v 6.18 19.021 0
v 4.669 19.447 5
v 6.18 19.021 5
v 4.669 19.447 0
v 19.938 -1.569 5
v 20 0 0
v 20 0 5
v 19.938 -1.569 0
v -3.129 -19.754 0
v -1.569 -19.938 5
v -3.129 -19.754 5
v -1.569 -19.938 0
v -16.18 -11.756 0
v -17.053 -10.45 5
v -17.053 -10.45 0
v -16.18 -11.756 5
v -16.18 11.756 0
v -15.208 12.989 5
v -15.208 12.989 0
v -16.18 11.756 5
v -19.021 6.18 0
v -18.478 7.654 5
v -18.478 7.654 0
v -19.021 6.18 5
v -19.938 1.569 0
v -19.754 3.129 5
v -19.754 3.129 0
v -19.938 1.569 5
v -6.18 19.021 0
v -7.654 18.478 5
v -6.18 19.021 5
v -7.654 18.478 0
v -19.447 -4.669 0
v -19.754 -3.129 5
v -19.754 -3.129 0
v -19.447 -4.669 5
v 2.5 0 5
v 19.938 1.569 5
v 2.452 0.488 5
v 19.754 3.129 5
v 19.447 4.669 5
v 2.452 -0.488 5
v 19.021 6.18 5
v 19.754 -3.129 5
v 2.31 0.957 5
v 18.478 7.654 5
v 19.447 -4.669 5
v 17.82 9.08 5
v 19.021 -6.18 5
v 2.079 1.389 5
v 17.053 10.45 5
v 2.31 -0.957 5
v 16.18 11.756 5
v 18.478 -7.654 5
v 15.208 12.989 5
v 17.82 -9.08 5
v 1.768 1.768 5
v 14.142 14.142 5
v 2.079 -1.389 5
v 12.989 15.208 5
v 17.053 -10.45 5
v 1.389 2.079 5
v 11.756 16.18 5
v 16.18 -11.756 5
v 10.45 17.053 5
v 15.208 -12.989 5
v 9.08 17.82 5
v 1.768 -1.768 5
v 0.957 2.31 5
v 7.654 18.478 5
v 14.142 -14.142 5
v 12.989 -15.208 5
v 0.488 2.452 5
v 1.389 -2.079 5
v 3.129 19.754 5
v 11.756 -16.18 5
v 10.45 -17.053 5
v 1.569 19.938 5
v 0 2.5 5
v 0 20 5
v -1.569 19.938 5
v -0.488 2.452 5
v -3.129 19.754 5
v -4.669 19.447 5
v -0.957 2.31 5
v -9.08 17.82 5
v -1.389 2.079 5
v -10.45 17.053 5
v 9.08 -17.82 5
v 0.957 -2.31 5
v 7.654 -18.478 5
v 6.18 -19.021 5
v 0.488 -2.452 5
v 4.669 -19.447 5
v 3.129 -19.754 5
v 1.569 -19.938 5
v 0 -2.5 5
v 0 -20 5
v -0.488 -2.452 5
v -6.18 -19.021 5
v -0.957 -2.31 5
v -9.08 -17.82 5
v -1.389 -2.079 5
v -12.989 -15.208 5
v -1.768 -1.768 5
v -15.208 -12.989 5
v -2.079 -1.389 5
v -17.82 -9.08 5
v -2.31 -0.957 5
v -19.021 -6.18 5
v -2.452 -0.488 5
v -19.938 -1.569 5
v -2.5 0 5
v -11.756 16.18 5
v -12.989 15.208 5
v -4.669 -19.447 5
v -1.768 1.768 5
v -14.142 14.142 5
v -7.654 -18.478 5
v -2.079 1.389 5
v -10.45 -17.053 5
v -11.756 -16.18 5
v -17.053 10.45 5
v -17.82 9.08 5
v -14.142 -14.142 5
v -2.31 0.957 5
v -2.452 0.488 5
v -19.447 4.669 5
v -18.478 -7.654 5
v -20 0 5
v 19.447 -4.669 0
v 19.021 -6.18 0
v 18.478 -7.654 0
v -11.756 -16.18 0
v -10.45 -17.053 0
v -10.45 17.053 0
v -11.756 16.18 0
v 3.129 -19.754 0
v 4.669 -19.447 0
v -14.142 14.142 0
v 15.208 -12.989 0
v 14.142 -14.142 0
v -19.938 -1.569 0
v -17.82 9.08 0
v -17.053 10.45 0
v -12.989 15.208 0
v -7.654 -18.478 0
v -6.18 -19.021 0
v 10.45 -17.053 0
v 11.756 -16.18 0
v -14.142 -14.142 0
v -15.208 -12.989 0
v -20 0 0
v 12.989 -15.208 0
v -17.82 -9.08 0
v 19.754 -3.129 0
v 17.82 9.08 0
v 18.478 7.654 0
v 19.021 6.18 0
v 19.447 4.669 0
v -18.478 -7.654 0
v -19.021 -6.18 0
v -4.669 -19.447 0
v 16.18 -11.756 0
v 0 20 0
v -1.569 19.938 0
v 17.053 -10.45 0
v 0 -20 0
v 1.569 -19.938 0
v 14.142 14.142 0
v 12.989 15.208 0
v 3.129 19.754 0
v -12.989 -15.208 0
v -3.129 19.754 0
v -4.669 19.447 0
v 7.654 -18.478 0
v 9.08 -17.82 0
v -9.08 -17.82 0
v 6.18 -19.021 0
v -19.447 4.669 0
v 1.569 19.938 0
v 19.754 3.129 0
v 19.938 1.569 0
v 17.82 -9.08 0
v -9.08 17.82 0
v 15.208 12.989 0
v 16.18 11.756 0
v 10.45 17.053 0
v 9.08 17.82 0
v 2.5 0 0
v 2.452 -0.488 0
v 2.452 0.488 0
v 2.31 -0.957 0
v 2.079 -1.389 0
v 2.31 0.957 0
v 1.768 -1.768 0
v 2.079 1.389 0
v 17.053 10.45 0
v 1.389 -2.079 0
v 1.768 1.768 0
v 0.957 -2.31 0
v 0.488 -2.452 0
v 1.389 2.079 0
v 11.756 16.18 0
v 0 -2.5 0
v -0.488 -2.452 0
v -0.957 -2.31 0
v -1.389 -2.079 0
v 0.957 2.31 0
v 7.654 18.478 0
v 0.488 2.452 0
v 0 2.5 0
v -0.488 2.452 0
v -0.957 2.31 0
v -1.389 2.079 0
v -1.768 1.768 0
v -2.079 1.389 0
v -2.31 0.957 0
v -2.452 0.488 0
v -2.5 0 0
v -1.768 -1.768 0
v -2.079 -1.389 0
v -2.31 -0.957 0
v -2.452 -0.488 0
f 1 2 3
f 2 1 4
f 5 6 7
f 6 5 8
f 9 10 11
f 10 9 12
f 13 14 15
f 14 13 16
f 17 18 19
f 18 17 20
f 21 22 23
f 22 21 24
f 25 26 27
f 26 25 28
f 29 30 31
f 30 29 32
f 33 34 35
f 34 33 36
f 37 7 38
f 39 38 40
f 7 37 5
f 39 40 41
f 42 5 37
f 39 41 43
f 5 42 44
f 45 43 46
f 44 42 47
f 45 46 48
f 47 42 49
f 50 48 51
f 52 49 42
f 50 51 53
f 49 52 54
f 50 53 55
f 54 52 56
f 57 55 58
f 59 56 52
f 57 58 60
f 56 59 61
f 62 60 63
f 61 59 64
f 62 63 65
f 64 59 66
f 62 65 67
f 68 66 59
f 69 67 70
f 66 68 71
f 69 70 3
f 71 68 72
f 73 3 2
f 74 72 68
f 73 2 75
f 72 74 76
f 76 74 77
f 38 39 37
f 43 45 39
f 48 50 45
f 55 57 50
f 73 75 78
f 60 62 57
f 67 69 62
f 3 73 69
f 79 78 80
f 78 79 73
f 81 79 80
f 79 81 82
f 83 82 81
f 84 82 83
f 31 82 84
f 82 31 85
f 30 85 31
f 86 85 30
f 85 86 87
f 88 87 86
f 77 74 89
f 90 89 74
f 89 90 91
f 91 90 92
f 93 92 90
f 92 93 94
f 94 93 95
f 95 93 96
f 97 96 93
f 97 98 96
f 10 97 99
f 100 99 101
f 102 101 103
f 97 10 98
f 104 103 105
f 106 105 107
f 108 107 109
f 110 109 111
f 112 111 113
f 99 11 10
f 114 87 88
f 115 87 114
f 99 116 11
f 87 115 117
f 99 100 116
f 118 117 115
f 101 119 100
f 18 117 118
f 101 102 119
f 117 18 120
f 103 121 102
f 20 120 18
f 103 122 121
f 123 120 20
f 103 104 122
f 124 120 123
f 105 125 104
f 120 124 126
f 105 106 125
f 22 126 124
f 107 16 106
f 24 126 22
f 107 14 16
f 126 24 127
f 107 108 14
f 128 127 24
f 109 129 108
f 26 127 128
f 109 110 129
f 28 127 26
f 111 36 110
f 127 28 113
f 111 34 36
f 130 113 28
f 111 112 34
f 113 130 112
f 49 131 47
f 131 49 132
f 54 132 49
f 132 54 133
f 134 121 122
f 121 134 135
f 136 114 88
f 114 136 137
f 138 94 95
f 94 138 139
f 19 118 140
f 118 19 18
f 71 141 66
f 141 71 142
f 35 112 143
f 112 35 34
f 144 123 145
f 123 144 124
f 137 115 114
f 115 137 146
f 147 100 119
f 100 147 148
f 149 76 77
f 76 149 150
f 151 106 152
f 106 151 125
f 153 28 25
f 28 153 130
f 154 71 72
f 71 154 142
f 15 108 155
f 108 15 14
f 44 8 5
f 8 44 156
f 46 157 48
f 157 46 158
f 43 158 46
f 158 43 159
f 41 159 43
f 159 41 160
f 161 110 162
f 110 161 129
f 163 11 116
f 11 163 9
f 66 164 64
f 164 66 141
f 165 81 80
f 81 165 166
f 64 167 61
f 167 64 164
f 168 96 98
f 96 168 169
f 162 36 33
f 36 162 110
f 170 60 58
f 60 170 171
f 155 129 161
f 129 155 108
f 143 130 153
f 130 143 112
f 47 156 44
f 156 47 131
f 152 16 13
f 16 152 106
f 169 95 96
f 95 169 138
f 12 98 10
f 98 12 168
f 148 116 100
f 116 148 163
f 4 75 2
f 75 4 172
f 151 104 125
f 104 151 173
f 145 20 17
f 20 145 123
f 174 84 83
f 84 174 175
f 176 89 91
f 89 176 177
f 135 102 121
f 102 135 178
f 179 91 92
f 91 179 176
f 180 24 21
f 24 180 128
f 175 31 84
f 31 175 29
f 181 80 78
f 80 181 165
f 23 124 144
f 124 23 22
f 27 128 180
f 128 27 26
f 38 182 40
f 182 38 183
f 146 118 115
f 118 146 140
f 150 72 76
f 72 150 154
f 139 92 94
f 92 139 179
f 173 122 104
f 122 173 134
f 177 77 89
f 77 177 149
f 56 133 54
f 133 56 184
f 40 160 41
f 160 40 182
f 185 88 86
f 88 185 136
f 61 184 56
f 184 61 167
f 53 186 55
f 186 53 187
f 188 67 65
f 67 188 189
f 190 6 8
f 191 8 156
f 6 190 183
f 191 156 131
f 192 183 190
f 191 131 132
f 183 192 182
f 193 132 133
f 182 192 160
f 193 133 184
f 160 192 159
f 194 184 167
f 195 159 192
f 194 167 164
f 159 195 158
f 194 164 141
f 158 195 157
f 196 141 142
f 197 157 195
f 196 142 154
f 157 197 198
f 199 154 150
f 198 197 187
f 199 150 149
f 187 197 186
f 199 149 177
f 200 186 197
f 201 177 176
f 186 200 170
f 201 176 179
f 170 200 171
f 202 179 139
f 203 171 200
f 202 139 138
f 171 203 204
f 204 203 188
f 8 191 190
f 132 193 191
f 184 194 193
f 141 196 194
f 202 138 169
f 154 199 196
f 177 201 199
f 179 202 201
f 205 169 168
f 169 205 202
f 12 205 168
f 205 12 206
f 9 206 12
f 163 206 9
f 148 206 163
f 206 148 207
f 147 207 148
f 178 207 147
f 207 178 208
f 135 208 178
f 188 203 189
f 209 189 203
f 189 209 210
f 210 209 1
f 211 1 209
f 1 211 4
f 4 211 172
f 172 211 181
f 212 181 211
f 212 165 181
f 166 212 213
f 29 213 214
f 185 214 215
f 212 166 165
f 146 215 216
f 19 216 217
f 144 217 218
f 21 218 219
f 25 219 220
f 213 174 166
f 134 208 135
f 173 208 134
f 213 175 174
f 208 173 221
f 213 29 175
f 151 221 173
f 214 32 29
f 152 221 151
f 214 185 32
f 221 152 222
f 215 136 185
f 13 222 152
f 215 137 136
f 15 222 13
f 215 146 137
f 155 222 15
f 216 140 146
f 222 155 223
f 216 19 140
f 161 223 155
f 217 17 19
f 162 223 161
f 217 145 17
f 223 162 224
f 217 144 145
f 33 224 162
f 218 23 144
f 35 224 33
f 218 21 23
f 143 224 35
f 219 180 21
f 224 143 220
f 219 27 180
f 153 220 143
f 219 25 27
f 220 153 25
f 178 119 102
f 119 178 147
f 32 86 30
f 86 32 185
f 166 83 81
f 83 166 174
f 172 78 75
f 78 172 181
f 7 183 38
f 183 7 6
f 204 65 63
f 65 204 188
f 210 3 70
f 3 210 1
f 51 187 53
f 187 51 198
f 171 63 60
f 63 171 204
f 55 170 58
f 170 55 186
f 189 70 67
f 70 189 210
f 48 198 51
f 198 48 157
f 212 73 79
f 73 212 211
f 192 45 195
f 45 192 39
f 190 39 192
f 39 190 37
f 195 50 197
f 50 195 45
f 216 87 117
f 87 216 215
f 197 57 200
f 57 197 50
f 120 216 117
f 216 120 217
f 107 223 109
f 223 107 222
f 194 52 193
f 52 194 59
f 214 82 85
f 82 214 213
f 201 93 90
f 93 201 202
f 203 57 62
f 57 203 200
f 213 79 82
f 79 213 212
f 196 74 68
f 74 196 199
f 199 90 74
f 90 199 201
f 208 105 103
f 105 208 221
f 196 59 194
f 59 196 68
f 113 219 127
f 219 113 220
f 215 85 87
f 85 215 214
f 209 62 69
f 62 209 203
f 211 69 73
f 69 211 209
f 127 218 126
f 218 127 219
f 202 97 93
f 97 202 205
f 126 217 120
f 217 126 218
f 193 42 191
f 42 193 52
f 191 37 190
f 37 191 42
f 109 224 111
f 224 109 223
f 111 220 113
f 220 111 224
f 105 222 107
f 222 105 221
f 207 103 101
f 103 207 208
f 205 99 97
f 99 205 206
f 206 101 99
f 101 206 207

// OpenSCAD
// Simple Gear Generator

/* [Gear Parameters] */
teeth = 20;           // [8:1:60] Number of teeth
module_val = 2;       // [1:0.5:5] Module (tooth size)
thickness = 5;        // [2:20] Gear thickness
bore = 5;             // [0:15] Center bore diameter

// Calculated values
pitch_radius = teeth * module_val / 2;
outer_radius = pitch_radius + module_val;
root_radius = pitch_radius - 1.25 * module_val;
tooth_angle = 360 / teeth;

// Gear body
difference() {
    // Gear profile
    linear_extrude(height=thickness) {
        // Simple approximation using circles at tooth positions
        circle(r=pitch_radius, $fn=teeth*4);
    }

    // Center bore
    if (bore > 0) {
        translate([0, 0, -1])
            cylinder(h=thickness+2, d=bore, $fn=32);
    }
}
